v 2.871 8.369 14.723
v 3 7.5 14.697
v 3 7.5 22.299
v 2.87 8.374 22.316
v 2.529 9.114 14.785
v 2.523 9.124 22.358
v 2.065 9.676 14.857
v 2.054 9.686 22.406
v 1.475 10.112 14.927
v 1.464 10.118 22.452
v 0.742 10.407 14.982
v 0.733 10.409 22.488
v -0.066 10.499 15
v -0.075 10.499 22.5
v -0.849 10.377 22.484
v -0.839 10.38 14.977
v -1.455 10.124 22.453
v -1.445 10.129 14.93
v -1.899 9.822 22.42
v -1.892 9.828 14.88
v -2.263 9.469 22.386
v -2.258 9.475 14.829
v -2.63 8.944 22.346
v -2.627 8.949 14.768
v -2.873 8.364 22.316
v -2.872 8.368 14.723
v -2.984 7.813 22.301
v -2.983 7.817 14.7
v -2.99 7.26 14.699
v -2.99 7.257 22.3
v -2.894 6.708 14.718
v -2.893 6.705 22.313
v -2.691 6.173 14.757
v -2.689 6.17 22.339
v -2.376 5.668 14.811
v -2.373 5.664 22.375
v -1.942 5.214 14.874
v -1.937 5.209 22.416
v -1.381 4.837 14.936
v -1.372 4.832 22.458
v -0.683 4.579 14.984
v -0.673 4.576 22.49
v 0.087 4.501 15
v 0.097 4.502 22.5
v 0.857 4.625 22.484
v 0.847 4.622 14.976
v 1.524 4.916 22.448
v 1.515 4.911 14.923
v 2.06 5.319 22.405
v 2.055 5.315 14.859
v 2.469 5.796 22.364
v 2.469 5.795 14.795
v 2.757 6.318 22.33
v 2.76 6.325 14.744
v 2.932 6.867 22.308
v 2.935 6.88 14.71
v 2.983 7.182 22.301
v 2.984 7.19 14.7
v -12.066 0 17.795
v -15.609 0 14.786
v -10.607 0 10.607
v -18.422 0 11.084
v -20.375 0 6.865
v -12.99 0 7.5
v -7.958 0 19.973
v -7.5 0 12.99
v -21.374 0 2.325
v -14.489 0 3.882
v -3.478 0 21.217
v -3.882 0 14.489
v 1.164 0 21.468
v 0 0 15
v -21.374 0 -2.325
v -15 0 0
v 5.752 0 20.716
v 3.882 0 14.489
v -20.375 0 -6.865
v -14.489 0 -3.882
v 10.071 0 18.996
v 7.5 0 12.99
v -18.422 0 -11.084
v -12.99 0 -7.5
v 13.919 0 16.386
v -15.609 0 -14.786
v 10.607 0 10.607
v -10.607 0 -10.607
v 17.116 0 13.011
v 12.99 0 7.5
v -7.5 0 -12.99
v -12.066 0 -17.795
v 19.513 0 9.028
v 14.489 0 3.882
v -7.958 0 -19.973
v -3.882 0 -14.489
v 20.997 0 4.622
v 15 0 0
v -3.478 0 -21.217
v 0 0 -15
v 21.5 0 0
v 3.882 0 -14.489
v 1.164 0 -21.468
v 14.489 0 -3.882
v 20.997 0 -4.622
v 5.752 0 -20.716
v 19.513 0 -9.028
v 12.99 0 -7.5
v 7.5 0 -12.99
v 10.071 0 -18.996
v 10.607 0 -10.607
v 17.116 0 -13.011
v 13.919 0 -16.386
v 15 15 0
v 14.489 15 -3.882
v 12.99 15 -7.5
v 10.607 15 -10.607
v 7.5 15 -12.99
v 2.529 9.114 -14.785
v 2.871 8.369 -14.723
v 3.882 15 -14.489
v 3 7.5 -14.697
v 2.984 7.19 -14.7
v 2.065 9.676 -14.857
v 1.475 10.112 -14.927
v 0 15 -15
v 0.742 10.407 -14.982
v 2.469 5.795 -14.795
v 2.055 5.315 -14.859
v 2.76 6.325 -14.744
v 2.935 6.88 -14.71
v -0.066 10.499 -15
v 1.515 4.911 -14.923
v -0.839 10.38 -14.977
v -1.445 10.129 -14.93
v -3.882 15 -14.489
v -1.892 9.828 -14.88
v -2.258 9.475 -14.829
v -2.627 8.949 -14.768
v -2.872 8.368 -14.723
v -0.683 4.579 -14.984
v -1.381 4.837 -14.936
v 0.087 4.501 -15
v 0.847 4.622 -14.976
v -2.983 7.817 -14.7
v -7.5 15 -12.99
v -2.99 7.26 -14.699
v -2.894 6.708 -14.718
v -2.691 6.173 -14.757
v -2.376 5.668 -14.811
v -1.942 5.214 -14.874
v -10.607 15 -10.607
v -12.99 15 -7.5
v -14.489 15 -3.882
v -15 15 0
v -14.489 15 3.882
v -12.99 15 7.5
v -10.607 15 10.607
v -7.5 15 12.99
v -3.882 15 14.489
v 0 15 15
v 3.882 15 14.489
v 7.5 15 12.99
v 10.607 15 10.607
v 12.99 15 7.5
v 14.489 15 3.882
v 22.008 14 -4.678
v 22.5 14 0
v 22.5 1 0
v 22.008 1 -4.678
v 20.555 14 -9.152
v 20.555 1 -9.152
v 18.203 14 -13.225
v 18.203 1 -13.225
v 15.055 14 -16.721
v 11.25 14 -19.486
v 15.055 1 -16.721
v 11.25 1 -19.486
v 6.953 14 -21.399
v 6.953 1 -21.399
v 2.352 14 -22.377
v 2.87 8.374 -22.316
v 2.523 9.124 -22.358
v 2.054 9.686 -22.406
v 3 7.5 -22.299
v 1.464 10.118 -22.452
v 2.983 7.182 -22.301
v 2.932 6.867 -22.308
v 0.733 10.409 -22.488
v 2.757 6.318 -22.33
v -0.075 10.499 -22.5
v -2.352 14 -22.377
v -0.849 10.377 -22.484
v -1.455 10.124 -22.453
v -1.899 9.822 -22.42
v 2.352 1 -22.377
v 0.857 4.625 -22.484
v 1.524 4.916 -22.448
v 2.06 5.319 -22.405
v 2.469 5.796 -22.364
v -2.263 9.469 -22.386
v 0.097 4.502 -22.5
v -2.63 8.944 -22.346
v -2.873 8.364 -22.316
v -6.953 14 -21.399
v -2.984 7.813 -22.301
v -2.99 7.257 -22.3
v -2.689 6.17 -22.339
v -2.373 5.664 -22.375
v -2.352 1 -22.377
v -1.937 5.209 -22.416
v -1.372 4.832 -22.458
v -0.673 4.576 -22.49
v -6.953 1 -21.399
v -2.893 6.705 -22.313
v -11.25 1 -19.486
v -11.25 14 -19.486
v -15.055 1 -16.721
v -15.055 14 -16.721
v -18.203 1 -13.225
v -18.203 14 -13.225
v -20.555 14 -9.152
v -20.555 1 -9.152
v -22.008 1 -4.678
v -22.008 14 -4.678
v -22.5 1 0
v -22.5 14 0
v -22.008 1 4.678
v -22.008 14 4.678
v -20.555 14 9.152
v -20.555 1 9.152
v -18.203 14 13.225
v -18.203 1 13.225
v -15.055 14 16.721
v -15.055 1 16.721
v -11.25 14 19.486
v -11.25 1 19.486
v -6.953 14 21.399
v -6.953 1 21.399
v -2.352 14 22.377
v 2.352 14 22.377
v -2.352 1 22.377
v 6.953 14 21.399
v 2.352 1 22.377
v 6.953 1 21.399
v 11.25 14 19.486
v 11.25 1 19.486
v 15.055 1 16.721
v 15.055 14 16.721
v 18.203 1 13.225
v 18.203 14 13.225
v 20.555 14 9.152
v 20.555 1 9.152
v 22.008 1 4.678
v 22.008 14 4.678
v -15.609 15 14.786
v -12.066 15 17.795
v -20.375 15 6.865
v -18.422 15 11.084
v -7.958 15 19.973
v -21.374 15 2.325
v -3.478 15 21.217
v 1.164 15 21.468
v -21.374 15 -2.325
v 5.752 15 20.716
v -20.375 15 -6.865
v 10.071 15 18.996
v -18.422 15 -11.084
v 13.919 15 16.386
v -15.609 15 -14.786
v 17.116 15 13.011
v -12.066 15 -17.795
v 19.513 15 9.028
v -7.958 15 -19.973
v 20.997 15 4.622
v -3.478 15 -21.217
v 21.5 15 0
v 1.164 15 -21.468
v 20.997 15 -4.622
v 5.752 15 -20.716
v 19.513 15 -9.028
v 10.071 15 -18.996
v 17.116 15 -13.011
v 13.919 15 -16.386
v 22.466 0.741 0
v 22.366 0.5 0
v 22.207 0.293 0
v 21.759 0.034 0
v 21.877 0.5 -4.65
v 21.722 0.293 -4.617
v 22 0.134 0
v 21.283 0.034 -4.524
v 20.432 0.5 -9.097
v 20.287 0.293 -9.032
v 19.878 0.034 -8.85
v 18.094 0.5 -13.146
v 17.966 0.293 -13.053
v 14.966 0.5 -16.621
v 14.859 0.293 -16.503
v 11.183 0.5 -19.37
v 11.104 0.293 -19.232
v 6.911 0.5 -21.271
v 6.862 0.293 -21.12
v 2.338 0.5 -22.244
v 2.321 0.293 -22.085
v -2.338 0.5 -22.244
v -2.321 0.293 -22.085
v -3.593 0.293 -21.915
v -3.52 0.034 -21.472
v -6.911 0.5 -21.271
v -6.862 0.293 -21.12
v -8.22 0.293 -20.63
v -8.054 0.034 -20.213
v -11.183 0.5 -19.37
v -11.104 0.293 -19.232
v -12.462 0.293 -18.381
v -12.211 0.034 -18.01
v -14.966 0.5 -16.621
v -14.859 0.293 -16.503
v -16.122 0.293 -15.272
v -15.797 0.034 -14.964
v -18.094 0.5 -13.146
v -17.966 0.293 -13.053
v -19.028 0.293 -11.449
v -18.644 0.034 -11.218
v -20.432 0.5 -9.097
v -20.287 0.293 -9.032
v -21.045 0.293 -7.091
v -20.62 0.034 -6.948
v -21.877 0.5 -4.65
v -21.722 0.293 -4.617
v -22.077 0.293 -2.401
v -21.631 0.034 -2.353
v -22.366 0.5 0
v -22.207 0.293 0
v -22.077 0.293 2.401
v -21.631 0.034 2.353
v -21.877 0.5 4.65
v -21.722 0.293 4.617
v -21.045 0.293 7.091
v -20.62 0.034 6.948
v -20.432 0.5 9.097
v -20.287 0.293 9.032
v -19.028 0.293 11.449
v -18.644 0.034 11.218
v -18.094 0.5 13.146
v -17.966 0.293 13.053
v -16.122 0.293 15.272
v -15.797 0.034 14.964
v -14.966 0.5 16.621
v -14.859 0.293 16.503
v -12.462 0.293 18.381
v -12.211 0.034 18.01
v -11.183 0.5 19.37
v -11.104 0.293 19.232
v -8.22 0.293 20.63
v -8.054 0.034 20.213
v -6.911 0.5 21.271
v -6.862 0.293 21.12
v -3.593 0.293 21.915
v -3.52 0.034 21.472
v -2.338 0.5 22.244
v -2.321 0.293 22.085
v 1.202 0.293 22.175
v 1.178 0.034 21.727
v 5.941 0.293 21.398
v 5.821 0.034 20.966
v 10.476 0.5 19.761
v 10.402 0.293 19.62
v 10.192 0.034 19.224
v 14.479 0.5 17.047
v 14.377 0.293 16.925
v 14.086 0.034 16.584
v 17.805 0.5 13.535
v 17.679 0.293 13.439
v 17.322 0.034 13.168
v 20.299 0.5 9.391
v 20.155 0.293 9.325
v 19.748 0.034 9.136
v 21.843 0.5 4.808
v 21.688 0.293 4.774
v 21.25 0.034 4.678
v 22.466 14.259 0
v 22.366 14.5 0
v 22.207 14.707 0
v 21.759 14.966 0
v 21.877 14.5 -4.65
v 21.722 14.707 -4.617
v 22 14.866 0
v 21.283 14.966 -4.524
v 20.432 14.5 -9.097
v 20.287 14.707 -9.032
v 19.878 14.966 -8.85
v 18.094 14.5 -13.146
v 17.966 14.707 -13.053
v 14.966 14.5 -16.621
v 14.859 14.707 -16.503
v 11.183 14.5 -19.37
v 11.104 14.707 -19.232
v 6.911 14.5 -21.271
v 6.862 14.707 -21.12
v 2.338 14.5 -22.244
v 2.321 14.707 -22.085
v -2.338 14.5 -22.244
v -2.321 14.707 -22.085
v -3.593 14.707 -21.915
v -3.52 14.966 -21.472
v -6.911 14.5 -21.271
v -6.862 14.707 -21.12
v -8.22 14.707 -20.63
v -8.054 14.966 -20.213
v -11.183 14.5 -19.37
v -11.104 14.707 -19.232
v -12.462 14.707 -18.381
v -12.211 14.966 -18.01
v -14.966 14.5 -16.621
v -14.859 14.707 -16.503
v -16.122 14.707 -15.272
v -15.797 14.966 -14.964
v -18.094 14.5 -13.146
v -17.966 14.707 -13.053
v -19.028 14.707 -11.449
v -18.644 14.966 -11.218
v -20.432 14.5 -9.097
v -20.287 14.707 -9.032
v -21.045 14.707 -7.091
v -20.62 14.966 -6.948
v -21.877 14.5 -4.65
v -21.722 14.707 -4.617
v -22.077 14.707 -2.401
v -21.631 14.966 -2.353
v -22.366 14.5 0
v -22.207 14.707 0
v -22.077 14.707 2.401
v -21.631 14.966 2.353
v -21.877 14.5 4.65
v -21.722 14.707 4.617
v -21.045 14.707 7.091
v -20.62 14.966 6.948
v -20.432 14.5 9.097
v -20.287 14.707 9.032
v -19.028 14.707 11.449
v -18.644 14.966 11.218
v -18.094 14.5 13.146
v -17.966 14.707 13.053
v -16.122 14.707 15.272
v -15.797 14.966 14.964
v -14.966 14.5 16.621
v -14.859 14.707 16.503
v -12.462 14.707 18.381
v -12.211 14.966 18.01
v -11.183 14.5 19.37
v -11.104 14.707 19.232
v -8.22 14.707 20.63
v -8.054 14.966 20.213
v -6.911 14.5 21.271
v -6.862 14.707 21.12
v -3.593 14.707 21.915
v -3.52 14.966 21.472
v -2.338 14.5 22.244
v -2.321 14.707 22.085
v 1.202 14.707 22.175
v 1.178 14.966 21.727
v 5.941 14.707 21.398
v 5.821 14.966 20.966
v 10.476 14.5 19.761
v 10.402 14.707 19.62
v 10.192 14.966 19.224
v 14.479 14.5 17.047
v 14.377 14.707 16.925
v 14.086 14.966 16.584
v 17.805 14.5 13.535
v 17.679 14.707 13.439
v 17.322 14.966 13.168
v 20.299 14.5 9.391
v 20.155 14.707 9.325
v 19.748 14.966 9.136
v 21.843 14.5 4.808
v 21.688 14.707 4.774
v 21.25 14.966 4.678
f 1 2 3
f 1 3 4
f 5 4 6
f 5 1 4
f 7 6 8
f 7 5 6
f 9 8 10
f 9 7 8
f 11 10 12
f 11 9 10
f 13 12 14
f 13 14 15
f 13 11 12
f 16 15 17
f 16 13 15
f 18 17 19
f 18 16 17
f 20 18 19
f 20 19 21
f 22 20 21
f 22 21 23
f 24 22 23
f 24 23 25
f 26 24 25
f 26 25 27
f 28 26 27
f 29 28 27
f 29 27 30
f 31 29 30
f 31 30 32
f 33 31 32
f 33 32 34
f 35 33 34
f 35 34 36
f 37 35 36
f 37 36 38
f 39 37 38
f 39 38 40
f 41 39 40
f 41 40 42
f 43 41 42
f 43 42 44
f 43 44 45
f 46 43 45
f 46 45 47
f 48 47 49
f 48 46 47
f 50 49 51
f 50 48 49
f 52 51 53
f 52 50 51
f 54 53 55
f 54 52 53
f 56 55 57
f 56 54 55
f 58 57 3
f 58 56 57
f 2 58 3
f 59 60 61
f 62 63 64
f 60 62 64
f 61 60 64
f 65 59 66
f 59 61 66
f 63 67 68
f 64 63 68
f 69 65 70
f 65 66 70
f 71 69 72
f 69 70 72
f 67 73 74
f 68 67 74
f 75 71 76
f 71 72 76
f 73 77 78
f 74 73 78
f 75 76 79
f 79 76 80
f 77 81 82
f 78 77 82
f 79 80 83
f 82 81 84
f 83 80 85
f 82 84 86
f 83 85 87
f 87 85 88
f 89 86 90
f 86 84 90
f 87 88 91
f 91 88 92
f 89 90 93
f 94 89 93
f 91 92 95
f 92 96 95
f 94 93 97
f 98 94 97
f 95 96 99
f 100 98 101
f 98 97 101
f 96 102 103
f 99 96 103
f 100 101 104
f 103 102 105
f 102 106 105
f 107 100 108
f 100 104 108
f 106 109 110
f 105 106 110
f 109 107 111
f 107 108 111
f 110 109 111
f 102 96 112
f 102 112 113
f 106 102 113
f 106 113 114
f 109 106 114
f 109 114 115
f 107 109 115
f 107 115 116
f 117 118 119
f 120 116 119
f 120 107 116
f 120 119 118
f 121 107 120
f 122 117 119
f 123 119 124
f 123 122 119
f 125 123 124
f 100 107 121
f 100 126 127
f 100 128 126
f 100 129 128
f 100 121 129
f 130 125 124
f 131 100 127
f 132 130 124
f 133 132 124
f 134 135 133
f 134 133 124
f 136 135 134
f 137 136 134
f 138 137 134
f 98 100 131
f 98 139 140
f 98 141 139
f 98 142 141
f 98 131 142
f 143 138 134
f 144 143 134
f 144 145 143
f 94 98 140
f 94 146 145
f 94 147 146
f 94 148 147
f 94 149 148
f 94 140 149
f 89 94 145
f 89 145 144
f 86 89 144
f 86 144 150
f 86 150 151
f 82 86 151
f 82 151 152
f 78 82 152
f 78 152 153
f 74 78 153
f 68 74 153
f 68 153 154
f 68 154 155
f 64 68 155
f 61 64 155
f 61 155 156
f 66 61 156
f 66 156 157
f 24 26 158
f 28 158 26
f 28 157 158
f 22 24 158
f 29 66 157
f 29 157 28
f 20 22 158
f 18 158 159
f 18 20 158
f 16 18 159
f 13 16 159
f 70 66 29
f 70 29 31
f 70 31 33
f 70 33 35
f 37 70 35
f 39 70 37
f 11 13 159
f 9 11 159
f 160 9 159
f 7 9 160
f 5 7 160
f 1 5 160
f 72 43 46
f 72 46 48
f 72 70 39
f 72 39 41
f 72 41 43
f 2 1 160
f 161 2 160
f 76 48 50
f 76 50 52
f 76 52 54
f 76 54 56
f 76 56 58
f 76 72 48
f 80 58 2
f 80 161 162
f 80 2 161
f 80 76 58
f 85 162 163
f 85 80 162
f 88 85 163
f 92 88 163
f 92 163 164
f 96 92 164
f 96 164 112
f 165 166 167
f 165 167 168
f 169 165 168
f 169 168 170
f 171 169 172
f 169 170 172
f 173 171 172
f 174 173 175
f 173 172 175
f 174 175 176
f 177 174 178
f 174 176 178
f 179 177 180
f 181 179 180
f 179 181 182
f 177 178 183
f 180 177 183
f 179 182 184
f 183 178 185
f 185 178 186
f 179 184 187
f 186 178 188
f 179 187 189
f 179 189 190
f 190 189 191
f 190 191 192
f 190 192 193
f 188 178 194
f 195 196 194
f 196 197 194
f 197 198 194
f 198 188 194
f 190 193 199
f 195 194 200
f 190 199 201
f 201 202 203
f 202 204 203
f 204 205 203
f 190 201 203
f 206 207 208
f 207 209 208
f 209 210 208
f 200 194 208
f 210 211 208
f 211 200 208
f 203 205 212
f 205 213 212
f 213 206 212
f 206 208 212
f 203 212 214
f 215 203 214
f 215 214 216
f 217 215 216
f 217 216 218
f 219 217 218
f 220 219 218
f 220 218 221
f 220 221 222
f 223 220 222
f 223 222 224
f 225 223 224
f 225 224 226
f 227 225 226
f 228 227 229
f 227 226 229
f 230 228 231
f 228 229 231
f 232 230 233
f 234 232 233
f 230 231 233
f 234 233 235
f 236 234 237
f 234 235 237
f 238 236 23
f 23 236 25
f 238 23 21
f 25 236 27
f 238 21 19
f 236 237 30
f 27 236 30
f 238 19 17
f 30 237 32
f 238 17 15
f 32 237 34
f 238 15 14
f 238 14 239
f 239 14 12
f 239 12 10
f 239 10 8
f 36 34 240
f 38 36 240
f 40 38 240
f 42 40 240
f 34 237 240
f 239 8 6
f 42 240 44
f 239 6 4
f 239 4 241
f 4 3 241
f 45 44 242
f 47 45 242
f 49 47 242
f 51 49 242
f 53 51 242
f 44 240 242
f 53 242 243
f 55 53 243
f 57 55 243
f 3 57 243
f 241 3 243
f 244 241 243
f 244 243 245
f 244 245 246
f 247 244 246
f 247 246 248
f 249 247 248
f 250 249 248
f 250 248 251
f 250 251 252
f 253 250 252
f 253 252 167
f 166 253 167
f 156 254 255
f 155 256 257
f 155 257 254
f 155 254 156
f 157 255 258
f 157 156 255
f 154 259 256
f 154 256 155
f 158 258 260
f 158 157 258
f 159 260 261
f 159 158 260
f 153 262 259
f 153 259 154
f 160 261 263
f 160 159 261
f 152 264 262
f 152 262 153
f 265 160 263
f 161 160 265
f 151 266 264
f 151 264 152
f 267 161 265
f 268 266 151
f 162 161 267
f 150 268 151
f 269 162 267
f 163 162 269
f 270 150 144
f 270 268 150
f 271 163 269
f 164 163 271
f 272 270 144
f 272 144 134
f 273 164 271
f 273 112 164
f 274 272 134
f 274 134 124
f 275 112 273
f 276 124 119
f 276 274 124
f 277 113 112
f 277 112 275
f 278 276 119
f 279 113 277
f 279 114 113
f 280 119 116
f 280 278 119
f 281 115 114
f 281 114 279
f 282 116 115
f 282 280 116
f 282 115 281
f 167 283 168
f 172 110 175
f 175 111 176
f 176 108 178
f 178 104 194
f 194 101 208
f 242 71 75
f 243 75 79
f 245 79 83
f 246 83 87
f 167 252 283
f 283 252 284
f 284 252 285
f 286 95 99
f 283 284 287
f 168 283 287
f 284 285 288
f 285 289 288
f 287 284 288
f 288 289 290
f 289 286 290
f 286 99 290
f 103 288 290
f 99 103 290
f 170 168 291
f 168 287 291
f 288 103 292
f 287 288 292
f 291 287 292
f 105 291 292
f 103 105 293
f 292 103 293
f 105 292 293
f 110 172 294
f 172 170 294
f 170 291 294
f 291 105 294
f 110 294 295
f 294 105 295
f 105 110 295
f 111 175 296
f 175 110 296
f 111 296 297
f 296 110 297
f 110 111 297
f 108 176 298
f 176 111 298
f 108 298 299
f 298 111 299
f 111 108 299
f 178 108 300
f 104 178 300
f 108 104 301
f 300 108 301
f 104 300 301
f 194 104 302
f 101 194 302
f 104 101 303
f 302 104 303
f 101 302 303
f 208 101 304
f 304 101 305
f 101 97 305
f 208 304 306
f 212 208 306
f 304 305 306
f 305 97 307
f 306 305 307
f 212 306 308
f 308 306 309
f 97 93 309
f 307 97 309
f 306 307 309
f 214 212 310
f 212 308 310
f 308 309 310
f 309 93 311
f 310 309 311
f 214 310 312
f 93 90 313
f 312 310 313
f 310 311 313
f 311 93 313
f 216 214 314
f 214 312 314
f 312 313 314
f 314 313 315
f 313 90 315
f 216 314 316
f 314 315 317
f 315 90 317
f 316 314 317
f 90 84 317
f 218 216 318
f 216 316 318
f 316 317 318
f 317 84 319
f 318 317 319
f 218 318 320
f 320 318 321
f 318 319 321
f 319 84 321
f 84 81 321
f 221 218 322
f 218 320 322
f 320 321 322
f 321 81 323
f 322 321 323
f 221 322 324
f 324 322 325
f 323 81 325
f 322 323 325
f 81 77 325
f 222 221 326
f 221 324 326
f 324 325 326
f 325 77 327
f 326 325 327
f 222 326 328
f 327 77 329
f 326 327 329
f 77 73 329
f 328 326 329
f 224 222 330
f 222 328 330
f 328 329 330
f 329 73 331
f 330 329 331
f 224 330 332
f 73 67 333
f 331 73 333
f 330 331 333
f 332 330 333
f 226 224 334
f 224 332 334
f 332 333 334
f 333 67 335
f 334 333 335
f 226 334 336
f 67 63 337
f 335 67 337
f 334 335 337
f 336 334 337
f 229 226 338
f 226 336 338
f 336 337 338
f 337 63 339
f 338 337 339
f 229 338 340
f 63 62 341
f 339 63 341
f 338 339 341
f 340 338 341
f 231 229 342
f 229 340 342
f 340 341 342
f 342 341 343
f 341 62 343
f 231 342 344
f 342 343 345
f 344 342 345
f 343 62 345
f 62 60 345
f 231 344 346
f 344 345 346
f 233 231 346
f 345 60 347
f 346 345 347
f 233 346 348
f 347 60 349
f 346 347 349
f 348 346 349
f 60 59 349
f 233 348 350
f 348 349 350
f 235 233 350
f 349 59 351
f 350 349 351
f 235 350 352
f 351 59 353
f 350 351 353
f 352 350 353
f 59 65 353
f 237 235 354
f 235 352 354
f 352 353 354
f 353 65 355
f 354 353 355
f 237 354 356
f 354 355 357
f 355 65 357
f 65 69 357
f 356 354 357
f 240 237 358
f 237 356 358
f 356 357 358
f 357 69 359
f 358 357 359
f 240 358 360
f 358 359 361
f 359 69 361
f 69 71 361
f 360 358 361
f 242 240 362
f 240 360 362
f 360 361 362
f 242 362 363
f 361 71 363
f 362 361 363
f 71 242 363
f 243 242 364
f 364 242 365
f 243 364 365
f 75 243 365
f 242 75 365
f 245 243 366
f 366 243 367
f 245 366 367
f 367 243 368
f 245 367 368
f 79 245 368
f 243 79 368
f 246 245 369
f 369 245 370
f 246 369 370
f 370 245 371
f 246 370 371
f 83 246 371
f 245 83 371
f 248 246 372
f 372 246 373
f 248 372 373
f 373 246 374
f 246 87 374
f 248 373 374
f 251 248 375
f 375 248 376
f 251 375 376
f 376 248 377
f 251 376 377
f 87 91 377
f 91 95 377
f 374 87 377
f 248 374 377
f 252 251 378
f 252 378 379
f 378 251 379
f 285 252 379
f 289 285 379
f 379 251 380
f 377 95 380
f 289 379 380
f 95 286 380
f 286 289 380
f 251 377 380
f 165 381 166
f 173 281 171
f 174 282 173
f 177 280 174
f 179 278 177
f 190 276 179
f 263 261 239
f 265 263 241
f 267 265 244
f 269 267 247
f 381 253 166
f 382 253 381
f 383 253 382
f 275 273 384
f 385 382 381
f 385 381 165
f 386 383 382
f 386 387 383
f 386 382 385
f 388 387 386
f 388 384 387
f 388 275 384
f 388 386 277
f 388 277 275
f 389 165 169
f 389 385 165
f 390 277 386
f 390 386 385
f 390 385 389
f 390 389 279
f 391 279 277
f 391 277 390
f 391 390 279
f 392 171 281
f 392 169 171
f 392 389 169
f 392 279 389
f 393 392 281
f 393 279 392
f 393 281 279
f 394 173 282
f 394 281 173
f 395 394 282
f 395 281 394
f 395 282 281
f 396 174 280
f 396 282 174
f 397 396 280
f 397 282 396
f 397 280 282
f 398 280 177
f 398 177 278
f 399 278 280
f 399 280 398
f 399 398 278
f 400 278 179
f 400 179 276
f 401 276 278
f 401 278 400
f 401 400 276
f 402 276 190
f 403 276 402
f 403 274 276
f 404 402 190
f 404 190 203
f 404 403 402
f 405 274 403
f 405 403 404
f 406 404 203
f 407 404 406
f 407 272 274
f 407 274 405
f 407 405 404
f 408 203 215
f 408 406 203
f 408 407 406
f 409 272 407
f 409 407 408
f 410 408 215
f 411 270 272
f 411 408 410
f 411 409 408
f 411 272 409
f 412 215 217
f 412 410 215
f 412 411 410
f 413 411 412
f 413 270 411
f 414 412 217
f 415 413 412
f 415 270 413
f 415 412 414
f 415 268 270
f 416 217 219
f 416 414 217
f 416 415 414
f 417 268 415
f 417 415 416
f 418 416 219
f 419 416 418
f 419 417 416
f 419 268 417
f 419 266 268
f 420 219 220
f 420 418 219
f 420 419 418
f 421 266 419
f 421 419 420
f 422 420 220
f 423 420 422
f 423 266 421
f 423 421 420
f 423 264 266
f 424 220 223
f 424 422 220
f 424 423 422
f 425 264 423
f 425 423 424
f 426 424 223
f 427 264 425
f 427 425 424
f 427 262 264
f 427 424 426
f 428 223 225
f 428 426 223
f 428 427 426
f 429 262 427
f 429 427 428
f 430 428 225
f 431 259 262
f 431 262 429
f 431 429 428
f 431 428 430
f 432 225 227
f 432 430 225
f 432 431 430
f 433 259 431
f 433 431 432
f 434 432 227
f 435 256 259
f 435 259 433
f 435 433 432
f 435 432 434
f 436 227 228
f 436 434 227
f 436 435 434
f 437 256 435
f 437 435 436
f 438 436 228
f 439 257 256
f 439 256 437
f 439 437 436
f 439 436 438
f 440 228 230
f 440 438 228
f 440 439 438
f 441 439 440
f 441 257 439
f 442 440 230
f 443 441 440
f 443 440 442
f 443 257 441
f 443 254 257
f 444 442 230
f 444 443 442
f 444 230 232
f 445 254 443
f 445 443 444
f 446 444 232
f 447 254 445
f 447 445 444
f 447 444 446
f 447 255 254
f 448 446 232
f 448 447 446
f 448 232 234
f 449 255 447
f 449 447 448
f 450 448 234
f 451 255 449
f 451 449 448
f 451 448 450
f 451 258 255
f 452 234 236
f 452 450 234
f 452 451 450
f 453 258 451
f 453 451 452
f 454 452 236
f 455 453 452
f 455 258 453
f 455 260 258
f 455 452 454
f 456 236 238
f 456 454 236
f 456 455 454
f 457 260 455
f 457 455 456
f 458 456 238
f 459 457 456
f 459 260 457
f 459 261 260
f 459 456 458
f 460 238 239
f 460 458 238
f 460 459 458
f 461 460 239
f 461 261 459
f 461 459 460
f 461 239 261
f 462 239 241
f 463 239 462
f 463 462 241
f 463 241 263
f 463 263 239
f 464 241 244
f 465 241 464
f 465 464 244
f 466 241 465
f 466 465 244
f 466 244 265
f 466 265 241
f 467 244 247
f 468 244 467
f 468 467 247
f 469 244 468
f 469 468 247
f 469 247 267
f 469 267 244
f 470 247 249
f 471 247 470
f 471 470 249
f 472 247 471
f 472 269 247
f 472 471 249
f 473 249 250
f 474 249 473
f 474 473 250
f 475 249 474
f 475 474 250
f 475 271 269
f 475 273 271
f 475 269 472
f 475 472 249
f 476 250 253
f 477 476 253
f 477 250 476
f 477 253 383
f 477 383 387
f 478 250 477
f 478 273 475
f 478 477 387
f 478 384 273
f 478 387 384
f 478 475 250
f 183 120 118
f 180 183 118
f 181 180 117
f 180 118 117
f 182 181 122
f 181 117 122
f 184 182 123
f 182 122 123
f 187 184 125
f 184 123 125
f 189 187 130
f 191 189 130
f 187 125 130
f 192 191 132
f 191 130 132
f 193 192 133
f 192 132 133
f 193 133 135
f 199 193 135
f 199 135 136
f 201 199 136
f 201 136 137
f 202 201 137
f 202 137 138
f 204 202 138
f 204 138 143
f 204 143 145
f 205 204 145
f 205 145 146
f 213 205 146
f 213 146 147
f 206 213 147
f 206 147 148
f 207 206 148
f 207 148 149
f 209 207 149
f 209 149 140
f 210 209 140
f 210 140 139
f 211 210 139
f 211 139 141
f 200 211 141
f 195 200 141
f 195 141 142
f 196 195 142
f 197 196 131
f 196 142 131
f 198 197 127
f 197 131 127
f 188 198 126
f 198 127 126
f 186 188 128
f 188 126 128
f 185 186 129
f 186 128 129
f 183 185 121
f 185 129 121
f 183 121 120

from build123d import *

# Parameters (mm, degrees)
SKETCH1_R               = 22.5
SKETCH1_R_2             = 15
BOSS_EXTRUDE1_DEPTH     = 15
SKETCH2_R               = 3
CUT_EXTRUDE1_DEPTH      = 23.5
CUT_EXTRUDE1_DEPTH_BACK = 23.5
FILLET1_R               = 1


with BuildPart() as part:
    # Sketch1 → Boss-Extrude1 (new body)
    with BuildSketch(Plane(origin=(0, 0, 0), x_dir=(1, 0, 0), z_dir=(0, 1, 0))):
        Circle(SKETCH1_R)
        Circle(SKETCH1_R_2, mode=Mode.SUBTRACT)
    extrude(amount=BOSS_EXTRUDE1_DEPTH)

    # Sketch2 → Cut-Extrude1 (cut, two sides)
    with BuildSketch(Plane.XY) as cut_extrude1_sk:
        with Locations((0, 7.5)):
            Circle(SKETCH2_R)
    extrude(amount=CUT_EXTRUDE1_DEPTH, mode=Mode.SUBTRACT)
    extrude(cut_extrude1_sk.sketch, amount=-CUT_EXTRUDE1_DEPTH_BACK, mode=Mode.SUBTRACT)

    # Fillet1
    fillet1_edges = [part.edges().sort_by_distance(p)[0] for p in [
        (-22.5, 0, 0),
        (-22.5, 15, 0),
    ]]
    fillet(fillet1_edges, radius=FILLET1_R)


solid = part.part
